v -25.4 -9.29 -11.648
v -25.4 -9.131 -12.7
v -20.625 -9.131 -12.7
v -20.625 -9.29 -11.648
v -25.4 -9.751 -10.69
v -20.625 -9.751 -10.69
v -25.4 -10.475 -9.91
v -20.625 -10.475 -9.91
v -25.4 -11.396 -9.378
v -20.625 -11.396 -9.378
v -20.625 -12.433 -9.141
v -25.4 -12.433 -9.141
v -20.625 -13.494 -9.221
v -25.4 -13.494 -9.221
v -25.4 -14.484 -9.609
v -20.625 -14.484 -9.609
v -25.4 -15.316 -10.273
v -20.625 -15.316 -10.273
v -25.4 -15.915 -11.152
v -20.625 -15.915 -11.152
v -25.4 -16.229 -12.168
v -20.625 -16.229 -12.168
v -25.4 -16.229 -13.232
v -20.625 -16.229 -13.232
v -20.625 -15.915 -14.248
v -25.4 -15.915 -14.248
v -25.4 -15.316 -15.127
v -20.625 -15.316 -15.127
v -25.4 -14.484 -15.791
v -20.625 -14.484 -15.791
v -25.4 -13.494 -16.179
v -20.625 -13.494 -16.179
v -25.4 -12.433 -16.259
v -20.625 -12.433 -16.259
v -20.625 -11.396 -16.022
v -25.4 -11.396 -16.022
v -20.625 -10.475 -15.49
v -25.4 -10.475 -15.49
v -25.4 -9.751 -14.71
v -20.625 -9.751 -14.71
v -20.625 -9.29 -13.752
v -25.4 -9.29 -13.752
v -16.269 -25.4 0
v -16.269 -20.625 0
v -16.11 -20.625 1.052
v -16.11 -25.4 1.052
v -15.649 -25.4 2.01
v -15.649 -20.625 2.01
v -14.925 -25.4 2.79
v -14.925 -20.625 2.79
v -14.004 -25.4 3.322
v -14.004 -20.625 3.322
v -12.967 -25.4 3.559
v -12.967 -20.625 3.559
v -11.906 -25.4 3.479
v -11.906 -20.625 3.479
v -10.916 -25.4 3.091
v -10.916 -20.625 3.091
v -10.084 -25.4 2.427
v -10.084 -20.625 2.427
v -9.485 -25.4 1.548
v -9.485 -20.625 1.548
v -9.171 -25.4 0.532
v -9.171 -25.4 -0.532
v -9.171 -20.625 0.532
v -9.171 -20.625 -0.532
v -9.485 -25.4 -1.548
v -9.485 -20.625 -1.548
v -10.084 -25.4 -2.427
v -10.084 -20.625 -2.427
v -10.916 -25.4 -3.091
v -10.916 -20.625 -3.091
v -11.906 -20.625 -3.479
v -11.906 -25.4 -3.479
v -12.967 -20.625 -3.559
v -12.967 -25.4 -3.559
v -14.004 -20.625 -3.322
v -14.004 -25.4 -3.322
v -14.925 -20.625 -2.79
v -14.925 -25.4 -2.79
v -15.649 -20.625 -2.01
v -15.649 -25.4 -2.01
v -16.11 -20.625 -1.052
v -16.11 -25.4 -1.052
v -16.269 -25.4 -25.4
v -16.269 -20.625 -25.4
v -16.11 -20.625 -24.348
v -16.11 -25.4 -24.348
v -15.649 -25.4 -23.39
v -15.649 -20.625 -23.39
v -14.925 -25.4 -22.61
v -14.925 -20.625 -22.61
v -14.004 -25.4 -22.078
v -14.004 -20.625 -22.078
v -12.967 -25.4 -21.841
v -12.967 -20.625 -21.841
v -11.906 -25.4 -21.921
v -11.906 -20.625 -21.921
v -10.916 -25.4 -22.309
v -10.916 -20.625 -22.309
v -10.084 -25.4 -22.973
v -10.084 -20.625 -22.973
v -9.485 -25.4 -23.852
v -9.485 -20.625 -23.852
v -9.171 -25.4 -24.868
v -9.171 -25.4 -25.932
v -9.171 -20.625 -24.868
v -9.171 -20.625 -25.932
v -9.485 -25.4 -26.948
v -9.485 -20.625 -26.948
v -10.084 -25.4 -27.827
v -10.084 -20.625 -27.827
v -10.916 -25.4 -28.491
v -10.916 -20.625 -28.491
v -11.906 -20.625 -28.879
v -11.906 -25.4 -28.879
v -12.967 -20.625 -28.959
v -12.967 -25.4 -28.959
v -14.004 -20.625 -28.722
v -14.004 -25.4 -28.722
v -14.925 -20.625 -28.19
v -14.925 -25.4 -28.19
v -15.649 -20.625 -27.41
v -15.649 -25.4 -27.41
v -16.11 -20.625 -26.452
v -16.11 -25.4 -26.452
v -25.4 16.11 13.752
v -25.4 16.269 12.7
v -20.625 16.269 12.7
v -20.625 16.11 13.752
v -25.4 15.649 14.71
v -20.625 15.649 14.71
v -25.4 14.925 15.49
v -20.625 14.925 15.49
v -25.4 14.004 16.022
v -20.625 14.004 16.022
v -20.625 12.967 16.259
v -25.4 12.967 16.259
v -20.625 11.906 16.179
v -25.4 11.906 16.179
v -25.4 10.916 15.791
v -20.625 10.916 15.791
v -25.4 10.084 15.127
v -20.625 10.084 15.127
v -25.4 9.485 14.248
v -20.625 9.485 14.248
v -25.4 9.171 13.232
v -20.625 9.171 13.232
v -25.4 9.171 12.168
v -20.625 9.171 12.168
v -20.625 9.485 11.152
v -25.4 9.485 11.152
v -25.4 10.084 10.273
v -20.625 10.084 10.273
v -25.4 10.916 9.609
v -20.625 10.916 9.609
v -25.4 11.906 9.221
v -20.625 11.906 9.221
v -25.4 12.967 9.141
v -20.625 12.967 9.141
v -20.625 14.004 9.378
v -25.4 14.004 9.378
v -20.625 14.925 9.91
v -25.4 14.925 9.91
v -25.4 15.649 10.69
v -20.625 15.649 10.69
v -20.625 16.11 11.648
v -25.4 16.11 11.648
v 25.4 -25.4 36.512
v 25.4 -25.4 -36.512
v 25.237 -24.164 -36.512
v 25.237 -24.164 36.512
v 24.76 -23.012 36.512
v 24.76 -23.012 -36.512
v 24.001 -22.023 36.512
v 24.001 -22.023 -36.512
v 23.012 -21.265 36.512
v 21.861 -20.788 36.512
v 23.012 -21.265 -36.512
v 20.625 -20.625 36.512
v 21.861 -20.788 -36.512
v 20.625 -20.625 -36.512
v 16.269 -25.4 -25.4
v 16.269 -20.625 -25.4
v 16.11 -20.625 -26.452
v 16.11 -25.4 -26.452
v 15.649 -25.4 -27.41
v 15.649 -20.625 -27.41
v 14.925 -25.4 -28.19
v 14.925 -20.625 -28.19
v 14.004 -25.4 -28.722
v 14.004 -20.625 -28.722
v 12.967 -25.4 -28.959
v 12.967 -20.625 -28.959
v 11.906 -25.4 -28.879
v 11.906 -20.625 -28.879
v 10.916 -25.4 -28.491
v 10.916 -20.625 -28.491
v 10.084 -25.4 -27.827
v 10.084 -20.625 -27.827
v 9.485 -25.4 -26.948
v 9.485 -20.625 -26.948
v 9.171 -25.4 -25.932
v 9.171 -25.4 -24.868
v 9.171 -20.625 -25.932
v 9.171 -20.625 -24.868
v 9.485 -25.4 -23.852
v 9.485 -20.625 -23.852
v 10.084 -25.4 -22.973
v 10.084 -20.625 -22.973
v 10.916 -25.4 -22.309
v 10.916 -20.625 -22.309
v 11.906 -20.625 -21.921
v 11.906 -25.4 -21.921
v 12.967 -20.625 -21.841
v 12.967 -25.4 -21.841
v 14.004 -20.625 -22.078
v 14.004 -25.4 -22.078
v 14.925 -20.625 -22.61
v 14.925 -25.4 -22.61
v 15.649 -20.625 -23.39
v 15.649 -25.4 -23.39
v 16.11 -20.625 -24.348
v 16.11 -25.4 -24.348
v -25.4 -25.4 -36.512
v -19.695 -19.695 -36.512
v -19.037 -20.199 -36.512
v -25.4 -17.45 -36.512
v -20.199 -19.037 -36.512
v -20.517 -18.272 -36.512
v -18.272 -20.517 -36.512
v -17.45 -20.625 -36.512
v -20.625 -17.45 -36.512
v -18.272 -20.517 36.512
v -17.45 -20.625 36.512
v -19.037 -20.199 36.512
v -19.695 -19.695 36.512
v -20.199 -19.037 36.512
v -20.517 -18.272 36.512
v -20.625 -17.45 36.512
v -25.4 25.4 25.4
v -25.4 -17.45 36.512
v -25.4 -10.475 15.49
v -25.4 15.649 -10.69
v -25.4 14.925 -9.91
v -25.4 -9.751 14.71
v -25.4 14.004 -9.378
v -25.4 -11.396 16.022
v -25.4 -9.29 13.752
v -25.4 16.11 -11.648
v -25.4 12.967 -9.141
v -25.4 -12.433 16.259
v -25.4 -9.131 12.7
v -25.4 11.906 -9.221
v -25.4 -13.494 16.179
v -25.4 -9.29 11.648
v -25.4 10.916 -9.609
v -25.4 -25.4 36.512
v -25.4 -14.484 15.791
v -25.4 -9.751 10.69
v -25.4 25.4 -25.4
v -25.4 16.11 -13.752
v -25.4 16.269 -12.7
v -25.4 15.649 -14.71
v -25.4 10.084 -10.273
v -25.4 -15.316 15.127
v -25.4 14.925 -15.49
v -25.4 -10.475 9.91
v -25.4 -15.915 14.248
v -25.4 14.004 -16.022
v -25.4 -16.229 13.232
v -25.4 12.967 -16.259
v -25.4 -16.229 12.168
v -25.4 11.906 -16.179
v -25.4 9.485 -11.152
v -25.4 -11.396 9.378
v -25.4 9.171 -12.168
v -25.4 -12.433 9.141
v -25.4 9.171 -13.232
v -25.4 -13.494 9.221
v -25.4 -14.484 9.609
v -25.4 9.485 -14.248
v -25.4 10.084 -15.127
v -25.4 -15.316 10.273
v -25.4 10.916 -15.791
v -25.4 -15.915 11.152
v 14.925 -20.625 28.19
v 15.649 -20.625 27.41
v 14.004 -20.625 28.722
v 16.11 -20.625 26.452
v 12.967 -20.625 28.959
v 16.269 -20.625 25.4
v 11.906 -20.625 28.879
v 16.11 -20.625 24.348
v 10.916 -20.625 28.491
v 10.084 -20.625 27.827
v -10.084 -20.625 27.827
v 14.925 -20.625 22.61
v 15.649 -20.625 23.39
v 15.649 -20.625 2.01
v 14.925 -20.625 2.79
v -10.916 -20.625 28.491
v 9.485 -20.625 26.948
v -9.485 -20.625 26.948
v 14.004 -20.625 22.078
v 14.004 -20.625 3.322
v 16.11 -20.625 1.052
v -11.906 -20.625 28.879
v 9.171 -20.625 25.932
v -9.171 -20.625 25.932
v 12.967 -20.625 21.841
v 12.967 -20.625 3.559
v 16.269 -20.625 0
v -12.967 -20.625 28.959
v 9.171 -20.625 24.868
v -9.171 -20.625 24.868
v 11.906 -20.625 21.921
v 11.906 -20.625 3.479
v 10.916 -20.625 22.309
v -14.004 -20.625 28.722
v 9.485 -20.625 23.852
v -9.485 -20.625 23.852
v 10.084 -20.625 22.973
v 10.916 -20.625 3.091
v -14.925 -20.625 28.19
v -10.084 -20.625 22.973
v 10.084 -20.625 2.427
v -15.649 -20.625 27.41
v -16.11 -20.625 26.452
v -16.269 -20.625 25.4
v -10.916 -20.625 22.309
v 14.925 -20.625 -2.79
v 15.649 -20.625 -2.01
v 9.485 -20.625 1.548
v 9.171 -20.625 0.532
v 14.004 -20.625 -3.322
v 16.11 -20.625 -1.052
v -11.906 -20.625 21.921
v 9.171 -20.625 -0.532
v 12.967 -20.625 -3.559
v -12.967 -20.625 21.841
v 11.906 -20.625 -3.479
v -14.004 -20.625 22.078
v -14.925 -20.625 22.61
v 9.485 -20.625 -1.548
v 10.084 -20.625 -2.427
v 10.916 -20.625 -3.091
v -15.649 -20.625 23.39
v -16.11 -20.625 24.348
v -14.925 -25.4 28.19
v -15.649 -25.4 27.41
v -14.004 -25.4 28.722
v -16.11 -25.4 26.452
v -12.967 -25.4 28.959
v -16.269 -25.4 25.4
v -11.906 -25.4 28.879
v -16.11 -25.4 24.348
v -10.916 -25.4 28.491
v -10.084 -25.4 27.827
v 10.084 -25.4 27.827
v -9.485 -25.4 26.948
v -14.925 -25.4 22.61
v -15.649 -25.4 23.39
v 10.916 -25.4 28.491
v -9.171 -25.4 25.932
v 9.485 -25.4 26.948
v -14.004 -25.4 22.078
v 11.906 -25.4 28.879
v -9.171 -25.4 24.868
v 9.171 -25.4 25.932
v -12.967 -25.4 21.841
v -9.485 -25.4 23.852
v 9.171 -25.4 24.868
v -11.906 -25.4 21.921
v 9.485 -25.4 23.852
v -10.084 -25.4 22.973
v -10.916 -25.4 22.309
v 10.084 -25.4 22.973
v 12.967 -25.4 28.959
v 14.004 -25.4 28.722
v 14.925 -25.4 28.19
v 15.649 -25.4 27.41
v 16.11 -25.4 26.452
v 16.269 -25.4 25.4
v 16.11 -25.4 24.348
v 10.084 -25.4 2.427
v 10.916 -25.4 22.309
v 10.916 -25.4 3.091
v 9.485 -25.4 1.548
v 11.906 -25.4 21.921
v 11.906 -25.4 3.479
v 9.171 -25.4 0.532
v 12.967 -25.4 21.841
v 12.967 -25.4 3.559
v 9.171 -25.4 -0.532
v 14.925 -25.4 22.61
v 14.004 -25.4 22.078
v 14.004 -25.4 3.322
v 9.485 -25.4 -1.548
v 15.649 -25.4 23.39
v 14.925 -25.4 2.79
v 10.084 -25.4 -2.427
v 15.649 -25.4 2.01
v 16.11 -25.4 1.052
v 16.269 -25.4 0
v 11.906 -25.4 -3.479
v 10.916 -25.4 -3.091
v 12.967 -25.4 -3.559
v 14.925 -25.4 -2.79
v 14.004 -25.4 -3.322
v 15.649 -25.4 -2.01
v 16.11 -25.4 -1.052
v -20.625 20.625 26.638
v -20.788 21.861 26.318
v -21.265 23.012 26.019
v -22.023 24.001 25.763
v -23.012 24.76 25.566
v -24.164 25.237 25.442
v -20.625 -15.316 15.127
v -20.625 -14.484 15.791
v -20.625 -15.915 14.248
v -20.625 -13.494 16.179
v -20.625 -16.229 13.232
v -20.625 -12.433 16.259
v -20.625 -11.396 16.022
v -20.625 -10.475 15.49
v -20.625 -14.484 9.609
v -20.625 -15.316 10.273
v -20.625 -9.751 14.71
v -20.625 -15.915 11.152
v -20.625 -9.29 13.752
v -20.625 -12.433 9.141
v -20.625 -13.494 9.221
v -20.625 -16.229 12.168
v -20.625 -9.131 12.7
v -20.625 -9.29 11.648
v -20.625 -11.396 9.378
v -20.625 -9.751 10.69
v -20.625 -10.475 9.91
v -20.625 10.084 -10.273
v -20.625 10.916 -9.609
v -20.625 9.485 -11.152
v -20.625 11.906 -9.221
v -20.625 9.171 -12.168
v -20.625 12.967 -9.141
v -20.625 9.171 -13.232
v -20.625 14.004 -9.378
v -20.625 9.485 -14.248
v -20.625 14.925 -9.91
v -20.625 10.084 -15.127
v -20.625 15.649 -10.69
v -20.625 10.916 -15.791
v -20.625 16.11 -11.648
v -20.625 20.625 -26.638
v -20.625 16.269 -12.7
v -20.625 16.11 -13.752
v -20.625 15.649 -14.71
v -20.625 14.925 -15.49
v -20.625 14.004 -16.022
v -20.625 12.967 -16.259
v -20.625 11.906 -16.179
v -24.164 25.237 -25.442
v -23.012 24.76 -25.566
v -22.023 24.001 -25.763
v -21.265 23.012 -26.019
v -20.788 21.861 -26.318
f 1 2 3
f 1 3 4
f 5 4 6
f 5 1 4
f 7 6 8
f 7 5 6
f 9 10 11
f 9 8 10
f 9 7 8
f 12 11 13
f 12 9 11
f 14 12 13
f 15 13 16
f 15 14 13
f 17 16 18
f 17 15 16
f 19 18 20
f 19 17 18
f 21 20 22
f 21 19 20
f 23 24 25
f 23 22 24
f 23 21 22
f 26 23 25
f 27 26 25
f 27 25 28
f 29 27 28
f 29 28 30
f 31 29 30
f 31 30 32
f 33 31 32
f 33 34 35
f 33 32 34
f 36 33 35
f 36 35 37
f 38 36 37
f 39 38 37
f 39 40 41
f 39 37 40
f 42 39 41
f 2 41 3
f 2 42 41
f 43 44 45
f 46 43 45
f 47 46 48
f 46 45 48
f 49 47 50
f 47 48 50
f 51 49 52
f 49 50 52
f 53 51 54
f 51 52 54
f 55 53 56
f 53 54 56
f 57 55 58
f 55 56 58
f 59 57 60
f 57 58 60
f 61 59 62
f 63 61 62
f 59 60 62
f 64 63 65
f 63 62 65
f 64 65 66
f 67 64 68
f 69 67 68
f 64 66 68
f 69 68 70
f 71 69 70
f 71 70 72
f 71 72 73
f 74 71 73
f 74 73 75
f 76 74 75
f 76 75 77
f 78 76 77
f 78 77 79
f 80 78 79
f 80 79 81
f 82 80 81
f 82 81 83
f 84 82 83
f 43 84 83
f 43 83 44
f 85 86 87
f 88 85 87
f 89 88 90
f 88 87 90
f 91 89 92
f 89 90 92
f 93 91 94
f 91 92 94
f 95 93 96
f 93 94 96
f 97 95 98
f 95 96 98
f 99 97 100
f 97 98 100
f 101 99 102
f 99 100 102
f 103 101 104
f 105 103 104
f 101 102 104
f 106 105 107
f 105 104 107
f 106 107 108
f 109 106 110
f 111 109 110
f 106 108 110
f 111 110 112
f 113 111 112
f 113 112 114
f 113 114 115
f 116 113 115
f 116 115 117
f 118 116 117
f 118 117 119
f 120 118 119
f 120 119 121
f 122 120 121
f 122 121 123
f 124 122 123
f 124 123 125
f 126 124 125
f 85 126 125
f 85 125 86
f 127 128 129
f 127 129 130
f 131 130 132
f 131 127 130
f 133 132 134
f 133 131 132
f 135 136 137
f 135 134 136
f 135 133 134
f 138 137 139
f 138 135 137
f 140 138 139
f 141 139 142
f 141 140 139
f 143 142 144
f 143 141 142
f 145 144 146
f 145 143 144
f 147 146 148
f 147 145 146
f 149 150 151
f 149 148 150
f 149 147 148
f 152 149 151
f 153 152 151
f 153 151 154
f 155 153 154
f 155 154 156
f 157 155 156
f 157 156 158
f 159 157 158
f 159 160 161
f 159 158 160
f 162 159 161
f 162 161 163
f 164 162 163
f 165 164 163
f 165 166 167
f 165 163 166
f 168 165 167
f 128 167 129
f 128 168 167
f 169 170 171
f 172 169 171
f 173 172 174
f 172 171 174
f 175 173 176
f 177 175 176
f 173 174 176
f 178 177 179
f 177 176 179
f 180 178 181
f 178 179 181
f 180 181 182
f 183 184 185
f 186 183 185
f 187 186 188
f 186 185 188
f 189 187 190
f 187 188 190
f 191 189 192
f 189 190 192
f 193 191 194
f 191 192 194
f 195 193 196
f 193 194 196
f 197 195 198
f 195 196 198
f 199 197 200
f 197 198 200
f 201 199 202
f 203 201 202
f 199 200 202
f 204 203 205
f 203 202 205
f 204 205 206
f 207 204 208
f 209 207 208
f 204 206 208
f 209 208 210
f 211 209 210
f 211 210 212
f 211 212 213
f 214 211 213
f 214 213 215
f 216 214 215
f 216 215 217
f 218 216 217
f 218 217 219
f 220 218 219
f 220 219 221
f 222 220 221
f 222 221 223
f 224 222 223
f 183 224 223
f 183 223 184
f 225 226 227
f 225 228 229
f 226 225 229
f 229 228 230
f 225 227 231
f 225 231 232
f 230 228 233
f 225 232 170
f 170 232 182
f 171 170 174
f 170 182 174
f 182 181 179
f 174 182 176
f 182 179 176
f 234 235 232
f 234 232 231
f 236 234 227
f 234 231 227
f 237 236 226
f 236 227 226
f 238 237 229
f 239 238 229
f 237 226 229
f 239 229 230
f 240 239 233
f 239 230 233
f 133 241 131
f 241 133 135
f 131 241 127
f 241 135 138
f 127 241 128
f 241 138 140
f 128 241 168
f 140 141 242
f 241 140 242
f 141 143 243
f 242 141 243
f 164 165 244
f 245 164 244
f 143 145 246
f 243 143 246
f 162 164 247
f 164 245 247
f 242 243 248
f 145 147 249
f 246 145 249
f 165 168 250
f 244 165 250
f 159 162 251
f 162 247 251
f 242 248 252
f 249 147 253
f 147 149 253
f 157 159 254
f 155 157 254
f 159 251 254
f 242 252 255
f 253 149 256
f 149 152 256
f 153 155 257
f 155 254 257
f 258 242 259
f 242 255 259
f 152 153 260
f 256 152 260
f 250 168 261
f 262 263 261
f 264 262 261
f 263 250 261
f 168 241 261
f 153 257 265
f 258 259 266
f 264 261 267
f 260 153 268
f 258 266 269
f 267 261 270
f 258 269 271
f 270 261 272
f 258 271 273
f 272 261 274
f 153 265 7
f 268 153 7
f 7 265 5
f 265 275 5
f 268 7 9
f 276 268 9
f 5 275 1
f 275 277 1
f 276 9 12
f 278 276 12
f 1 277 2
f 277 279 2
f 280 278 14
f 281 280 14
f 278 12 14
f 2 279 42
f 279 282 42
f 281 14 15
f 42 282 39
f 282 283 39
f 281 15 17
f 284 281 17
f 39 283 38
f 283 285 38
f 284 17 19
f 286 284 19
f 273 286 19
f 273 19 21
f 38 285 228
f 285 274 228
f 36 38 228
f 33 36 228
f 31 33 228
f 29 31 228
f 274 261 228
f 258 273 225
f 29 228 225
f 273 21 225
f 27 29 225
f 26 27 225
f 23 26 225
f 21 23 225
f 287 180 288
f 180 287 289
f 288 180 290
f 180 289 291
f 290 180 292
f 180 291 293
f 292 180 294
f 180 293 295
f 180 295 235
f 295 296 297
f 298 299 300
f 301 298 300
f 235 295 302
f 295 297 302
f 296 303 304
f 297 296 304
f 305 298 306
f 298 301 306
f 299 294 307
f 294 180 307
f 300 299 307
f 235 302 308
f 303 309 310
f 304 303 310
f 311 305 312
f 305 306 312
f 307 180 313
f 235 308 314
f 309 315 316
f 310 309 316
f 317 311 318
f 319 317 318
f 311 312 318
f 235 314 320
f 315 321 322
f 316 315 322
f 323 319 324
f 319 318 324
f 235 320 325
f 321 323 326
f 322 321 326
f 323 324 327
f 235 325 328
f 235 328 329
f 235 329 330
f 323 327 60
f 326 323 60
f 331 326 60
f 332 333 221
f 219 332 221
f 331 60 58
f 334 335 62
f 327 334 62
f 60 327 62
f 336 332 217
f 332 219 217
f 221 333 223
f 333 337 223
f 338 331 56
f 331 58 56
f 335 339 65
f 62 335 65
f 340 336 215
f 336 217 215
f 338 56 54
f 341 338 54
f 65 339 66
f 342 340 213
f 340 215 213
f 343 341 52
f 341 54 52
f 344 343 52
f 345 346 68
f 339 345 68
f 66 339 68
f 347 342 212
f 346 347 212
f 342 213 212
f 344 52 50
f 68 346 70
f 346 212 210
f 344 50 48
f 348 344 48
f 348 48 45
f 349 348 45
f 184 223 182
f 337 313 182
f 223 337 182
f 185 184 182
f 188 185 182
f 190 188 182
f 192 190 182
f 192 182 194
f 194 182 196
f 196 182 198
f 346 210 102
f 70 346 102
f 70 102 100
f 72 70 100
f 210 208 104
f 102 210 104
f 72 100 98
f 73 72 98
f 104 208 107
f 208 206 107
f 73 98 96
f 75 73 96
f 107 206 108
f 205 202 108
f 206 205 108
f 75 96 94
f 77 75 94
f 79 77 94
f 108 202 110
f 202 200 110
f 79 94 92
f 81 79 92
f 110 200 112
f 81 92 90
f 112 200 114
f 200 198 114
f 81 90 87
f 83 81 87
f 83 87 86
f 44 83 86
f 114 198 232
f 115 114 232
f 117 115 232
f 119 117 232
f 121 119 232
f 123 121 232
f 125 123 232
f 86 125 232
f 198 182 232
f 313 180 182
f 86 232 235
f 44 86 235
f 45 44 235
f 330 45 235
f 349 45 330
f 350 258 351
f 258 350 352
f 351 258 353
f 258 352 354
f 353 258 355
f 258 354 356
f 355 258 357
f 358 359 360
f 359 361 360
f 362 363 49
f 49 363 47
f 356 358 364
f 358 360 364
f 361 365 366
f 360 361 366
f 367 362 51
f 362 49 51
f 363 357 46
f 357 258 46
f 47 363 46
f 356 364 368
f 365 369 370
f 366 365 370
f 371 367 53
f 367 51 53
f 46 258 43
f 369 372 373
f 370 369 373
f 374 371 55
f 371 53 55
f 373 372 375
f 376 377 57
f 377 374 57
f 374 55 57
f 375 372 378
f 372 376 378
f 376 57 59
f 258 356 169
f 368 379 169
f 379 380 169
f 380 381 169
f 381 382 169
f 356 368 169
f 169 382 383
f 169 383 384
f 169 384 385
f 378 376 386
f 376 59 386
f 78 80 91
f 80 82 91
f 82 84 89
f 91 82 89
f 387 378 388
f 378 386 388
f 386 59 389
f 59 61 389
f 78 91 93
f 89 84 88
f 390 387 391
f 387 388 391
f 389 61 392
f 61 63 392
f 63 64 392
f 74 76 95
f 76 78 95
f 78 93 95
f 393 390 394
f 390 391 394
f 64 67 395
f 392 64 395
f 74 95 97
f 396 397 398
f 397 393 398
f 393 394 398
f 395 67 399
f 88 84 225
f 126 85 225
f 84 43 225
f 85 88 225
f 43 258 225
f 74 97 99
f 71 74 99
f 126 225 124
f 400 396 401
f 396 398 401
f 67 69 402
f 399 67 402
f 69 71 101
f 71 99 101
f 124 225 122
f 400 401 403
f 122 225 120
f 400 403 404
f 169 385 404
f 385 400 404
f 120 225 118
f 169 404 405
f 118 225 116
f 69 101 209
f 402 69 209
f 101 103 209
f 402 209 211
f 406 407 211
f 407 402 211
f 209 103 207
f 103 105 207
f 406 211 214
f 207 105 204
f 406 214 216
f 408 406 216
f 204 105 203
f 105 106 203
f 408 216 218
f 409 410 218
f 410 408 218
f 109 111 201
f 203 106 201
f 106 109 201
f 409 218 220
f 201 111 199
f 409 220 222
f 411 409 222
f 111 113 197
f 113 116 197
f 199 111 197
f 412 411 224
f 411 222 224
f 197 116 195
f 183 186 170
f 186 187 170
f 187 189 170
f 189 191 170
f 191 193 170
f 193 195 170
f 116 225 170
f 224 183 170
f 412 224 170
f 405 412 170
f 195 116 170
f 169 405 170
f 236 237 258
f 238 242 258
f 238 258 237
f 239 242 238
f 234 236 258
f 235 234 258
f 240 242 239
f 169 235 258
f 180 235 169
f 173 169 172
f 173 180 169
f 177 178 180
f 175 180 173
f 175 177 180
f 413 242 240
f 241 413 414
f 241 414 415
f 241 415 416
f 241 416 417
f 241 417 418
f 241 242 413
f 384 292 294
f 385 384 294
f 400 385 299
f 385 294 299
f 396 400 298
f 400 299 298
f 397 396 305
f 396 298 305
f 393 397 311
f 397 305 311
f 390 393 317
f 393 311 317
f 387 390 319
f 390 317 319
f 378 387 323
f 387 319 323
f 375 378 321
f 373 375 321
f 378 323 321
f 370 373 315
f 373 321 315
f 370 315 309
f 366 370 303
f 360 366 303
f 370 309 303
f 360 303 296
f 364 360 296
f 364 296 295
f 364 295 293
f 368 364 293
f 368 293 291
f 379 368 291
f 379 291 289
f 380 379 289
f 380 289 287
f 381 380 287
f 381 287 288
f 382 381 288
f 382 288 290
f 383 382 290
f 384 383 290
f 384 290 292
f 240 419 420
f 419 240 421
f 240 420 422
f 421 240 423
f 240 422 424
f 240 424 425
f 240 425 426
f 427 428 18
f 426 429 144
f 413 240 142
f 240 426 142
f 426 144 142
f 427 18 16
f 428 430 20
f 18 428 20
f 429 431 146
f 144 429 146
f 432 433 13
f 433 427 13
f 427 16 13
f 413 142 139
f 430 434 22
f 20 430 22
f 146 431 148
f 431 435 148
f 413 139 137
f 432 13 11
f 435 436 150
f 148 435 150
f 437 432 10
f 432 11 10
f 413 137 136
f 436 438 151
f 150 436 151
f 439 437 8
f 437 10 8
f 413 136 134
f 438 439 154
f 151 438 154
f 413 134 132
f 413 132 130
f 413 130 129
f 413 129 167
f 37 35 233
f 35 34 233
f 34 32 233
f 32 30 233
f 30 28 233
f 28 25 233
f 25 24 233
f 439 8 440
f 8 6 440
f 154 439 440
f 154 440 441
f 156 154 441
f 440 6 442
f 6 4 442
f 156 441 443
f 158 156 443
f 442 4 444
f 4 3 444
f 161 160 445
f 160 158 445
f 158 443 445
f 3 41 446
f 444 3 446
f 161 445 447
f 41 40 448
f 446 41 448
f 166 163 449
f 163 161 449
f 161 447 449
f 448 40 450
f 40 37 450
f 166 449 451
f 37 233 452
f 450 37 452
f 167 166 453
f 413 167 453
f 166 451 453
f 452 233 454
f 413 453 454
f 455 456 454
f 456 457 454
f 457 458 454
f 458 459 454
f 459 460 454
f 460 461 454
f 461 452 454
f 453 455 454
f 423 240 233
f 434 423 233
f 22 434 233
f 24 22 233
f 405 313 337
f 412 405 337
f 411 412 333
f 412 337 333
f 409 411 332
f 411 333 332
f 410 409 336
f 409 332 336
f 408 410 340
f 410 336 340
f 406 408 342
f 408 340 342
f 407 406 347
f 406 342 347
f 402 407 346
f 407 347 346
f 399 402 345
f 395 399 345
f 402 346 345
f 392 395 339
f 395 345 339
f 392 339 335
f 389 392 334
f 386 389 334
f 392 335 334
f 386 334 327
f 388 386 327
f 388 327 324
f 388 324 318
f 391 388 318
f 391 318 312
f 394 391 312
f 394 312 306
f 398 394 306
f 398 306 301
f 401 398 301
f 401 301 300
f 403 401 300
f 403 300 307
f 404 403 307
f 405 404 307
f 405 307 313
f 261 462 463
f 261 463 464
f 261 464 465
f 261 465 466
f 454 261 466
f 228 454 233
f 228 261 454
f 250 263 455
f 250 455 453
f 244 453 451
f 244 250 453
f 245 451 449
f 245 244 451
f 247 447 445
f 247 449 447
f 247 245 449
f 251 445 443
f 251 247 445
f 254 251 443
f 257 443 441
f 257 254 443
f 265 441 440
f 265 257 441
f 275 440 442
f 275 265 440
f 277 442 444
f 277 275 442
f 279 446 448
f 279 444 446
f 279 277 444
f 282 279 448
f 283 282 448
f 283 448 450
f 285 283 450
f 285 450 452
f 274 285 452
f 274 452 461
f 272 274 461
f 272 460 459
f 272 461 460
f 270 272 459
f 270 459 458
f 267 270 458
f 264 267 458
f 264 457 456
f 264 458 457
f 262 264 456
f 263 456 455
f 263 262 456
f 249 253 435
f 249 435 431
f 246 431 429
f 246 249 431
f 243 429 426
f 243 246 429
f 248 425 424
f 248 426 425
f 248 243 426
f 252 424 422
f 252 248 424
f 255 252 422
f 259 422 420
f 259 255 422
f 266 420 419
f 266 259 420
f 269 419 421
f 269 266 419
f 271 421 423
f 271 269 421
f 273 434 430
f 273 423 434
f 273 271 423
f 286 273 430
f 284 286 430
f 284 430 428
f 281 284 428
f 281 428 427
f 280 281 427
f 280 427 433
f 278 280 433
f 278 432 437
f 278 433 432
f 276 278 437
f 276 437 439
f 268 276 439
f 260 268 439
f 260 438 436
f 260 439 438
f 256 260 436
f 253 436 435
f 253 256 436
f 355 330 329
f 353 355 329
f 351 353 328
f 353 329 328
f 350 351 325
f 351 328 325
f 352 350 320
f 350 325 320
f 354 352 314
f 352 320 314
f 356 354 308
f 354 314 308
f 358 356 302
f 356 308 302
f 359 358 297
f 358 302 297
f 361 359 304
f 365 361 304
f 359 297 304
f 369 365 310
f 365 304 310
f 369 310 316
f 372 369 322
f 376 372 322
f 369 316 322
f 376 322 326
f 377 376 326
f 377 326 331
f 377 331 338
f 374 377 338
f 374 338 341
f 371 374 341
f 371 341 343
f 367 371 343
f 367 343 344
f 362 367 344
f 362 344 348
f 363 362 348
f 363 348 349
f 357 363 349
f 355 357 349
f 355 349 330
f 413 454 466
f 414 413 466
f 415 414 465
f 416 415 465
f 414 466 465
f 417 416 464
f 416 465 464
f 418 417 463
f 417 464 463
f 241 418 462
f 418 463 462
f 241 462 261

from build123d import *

# Parameters (mm, degrees)
BOSS_EXTRUDE1_DEPTH      = 36.5125
BOSS_EXTRUDE1_DEPTH_BACK = 36.5125
CUT_EXTRUDE1_DEPTH       = 65.004725383
CUT_EXTRUDE1_DEPTH_BACK  = 65.004725383
CUT_EXTRUDE2_DEPTH       = 65.004725383
CUT_EXTRUDE2_DEPTH_BACK  = 65.004725383
SKETCH6_R                = 3.5687
SKETCH7_R                = 3.5687
CUT_EXTRUDE3_DEPTH       = 65.004725383


with BuildPart() as part:
    # Sketch4 → Boss-Extrude1 (new, two sides: drawn at the far end of the back side and taken through both)
    with BuildSketch(Plane.XY.offset(-BOSS_EXTRUDE1_DEPTH_BACK)):
        with BuildLine():
            Line((-25.4, 25.4), (-25.4, -25.4))
            Line((-25.4, -25.4), (25.4, -25.4))
            ThreePointArc((25.4, -25.4), (24.001376302, -22.023423698), (20.6248, -20.6248))
            Line((20.6248, -20.6248), (-17.4498, -20.6248))
            ThreePointArc((-17.4498, -20.6248), (-19.69486403, -19.69486403), (-20.6248, -17.4498))
            Line((-20.6248, -17.4498), (-20.6248, 20.6248))
            ThreePointArc((-20.6248, 20.6248), (-22.023423698, 24.001376302), (-25.4, 25.4))
        make_face()
    extrude(amount=BOSS_EXTRUDE1_DEPTH + BOSS_EXTRUDE1_DEPTH_BACK)

    # Sketch5 → Cut-Extrude1 (cut, two sides: drawn at the far end of the back side and taken through both)
    with BuildSketch(Plane(origin=(-20.6248, 0, 0), x_dir=(0, 0, -1), z_dir=(1, 0, 0)).offset(-CUT_EXTRUDE1_DEPTH_BACK)):
        Polygon((-36.5125, -17.4498), (-25.4, 25.4), (-36.5125, 25.4), align=None)
        Polygon((36.5125, 25.4), (25.4, 25.4), (36.5125, -17.4498), align=None)
    extrude(amount=CUT_EXTRUDE1_DEPTH + CUT_EXTRUDE1_DEPTH_BACK, mode=Mode.SUBTRACT)

    # Sketch6 → Cut-Extrude2 (cut, two sides: drawn at the far end of the back side and taken through both)
    with BuildSketch(Plane(origin=(-20.6248, 0, 0), x_dir=(0, 0, -1), z_dir=(1, 0, 0)).offset(-CUT_EXTRUDE2_DEPTH_BACK)):
        with Locations(Location((-12.7, 12.7, 0), (0, 0, 90))):
            Circle(SKETCH6_R)
        with Locations(Location((-12.7, -12.7, 0), (0, 0, 90))):
            Circle(SKETCH6_R)
        with Locations(Location((12.7, -12.7, 0), (0, 0, 90))):
            Circle(SKETCH6_R)
        with Locations(Location((12.7, 12.7, 0), (0, 0, 90))):
            Circle(SKETCH6_R)
    extrude(amount=CUT_EXTRUDE2_DEPTH + CUT_EXTRUDE2_DEPTH_BACK, mode=Mode.SUBTRACT)

    # Sketch7 → Cut-Extrude3 (cut, through all)
    with BuildSketch(Plane(origin=(0, -20.6248, 0), x_dir=(1, 0, 0), z_dir=(0, 1, 0))):
        with Locations(Location((-12.7, 0, 0), (0, 0, 180))):
            Circle(SKETCH7_R)
        with Locations(Location((-12.7, 25.4, 0), (0, 0, 180))):
            Circle(SKETCH7_R)
        with Locations(Location((-12.7, -25.4, 0), (0, 0, 180))):
            Circle(SKETCH7_R)
        with Locations((12.7, -25.4)):
            Circle(SKETCH7_R)
        with Locations((12.7, 25.4)):
            Circle(SKETCH7_R)
        with Locations((12.7, 0)):
            Circle(SKETCH7_R)
    extrude(amount=-CUT_EXTRUDE3_DEPTH, mode=Mode.SUBTRACT)


solid = part.part
